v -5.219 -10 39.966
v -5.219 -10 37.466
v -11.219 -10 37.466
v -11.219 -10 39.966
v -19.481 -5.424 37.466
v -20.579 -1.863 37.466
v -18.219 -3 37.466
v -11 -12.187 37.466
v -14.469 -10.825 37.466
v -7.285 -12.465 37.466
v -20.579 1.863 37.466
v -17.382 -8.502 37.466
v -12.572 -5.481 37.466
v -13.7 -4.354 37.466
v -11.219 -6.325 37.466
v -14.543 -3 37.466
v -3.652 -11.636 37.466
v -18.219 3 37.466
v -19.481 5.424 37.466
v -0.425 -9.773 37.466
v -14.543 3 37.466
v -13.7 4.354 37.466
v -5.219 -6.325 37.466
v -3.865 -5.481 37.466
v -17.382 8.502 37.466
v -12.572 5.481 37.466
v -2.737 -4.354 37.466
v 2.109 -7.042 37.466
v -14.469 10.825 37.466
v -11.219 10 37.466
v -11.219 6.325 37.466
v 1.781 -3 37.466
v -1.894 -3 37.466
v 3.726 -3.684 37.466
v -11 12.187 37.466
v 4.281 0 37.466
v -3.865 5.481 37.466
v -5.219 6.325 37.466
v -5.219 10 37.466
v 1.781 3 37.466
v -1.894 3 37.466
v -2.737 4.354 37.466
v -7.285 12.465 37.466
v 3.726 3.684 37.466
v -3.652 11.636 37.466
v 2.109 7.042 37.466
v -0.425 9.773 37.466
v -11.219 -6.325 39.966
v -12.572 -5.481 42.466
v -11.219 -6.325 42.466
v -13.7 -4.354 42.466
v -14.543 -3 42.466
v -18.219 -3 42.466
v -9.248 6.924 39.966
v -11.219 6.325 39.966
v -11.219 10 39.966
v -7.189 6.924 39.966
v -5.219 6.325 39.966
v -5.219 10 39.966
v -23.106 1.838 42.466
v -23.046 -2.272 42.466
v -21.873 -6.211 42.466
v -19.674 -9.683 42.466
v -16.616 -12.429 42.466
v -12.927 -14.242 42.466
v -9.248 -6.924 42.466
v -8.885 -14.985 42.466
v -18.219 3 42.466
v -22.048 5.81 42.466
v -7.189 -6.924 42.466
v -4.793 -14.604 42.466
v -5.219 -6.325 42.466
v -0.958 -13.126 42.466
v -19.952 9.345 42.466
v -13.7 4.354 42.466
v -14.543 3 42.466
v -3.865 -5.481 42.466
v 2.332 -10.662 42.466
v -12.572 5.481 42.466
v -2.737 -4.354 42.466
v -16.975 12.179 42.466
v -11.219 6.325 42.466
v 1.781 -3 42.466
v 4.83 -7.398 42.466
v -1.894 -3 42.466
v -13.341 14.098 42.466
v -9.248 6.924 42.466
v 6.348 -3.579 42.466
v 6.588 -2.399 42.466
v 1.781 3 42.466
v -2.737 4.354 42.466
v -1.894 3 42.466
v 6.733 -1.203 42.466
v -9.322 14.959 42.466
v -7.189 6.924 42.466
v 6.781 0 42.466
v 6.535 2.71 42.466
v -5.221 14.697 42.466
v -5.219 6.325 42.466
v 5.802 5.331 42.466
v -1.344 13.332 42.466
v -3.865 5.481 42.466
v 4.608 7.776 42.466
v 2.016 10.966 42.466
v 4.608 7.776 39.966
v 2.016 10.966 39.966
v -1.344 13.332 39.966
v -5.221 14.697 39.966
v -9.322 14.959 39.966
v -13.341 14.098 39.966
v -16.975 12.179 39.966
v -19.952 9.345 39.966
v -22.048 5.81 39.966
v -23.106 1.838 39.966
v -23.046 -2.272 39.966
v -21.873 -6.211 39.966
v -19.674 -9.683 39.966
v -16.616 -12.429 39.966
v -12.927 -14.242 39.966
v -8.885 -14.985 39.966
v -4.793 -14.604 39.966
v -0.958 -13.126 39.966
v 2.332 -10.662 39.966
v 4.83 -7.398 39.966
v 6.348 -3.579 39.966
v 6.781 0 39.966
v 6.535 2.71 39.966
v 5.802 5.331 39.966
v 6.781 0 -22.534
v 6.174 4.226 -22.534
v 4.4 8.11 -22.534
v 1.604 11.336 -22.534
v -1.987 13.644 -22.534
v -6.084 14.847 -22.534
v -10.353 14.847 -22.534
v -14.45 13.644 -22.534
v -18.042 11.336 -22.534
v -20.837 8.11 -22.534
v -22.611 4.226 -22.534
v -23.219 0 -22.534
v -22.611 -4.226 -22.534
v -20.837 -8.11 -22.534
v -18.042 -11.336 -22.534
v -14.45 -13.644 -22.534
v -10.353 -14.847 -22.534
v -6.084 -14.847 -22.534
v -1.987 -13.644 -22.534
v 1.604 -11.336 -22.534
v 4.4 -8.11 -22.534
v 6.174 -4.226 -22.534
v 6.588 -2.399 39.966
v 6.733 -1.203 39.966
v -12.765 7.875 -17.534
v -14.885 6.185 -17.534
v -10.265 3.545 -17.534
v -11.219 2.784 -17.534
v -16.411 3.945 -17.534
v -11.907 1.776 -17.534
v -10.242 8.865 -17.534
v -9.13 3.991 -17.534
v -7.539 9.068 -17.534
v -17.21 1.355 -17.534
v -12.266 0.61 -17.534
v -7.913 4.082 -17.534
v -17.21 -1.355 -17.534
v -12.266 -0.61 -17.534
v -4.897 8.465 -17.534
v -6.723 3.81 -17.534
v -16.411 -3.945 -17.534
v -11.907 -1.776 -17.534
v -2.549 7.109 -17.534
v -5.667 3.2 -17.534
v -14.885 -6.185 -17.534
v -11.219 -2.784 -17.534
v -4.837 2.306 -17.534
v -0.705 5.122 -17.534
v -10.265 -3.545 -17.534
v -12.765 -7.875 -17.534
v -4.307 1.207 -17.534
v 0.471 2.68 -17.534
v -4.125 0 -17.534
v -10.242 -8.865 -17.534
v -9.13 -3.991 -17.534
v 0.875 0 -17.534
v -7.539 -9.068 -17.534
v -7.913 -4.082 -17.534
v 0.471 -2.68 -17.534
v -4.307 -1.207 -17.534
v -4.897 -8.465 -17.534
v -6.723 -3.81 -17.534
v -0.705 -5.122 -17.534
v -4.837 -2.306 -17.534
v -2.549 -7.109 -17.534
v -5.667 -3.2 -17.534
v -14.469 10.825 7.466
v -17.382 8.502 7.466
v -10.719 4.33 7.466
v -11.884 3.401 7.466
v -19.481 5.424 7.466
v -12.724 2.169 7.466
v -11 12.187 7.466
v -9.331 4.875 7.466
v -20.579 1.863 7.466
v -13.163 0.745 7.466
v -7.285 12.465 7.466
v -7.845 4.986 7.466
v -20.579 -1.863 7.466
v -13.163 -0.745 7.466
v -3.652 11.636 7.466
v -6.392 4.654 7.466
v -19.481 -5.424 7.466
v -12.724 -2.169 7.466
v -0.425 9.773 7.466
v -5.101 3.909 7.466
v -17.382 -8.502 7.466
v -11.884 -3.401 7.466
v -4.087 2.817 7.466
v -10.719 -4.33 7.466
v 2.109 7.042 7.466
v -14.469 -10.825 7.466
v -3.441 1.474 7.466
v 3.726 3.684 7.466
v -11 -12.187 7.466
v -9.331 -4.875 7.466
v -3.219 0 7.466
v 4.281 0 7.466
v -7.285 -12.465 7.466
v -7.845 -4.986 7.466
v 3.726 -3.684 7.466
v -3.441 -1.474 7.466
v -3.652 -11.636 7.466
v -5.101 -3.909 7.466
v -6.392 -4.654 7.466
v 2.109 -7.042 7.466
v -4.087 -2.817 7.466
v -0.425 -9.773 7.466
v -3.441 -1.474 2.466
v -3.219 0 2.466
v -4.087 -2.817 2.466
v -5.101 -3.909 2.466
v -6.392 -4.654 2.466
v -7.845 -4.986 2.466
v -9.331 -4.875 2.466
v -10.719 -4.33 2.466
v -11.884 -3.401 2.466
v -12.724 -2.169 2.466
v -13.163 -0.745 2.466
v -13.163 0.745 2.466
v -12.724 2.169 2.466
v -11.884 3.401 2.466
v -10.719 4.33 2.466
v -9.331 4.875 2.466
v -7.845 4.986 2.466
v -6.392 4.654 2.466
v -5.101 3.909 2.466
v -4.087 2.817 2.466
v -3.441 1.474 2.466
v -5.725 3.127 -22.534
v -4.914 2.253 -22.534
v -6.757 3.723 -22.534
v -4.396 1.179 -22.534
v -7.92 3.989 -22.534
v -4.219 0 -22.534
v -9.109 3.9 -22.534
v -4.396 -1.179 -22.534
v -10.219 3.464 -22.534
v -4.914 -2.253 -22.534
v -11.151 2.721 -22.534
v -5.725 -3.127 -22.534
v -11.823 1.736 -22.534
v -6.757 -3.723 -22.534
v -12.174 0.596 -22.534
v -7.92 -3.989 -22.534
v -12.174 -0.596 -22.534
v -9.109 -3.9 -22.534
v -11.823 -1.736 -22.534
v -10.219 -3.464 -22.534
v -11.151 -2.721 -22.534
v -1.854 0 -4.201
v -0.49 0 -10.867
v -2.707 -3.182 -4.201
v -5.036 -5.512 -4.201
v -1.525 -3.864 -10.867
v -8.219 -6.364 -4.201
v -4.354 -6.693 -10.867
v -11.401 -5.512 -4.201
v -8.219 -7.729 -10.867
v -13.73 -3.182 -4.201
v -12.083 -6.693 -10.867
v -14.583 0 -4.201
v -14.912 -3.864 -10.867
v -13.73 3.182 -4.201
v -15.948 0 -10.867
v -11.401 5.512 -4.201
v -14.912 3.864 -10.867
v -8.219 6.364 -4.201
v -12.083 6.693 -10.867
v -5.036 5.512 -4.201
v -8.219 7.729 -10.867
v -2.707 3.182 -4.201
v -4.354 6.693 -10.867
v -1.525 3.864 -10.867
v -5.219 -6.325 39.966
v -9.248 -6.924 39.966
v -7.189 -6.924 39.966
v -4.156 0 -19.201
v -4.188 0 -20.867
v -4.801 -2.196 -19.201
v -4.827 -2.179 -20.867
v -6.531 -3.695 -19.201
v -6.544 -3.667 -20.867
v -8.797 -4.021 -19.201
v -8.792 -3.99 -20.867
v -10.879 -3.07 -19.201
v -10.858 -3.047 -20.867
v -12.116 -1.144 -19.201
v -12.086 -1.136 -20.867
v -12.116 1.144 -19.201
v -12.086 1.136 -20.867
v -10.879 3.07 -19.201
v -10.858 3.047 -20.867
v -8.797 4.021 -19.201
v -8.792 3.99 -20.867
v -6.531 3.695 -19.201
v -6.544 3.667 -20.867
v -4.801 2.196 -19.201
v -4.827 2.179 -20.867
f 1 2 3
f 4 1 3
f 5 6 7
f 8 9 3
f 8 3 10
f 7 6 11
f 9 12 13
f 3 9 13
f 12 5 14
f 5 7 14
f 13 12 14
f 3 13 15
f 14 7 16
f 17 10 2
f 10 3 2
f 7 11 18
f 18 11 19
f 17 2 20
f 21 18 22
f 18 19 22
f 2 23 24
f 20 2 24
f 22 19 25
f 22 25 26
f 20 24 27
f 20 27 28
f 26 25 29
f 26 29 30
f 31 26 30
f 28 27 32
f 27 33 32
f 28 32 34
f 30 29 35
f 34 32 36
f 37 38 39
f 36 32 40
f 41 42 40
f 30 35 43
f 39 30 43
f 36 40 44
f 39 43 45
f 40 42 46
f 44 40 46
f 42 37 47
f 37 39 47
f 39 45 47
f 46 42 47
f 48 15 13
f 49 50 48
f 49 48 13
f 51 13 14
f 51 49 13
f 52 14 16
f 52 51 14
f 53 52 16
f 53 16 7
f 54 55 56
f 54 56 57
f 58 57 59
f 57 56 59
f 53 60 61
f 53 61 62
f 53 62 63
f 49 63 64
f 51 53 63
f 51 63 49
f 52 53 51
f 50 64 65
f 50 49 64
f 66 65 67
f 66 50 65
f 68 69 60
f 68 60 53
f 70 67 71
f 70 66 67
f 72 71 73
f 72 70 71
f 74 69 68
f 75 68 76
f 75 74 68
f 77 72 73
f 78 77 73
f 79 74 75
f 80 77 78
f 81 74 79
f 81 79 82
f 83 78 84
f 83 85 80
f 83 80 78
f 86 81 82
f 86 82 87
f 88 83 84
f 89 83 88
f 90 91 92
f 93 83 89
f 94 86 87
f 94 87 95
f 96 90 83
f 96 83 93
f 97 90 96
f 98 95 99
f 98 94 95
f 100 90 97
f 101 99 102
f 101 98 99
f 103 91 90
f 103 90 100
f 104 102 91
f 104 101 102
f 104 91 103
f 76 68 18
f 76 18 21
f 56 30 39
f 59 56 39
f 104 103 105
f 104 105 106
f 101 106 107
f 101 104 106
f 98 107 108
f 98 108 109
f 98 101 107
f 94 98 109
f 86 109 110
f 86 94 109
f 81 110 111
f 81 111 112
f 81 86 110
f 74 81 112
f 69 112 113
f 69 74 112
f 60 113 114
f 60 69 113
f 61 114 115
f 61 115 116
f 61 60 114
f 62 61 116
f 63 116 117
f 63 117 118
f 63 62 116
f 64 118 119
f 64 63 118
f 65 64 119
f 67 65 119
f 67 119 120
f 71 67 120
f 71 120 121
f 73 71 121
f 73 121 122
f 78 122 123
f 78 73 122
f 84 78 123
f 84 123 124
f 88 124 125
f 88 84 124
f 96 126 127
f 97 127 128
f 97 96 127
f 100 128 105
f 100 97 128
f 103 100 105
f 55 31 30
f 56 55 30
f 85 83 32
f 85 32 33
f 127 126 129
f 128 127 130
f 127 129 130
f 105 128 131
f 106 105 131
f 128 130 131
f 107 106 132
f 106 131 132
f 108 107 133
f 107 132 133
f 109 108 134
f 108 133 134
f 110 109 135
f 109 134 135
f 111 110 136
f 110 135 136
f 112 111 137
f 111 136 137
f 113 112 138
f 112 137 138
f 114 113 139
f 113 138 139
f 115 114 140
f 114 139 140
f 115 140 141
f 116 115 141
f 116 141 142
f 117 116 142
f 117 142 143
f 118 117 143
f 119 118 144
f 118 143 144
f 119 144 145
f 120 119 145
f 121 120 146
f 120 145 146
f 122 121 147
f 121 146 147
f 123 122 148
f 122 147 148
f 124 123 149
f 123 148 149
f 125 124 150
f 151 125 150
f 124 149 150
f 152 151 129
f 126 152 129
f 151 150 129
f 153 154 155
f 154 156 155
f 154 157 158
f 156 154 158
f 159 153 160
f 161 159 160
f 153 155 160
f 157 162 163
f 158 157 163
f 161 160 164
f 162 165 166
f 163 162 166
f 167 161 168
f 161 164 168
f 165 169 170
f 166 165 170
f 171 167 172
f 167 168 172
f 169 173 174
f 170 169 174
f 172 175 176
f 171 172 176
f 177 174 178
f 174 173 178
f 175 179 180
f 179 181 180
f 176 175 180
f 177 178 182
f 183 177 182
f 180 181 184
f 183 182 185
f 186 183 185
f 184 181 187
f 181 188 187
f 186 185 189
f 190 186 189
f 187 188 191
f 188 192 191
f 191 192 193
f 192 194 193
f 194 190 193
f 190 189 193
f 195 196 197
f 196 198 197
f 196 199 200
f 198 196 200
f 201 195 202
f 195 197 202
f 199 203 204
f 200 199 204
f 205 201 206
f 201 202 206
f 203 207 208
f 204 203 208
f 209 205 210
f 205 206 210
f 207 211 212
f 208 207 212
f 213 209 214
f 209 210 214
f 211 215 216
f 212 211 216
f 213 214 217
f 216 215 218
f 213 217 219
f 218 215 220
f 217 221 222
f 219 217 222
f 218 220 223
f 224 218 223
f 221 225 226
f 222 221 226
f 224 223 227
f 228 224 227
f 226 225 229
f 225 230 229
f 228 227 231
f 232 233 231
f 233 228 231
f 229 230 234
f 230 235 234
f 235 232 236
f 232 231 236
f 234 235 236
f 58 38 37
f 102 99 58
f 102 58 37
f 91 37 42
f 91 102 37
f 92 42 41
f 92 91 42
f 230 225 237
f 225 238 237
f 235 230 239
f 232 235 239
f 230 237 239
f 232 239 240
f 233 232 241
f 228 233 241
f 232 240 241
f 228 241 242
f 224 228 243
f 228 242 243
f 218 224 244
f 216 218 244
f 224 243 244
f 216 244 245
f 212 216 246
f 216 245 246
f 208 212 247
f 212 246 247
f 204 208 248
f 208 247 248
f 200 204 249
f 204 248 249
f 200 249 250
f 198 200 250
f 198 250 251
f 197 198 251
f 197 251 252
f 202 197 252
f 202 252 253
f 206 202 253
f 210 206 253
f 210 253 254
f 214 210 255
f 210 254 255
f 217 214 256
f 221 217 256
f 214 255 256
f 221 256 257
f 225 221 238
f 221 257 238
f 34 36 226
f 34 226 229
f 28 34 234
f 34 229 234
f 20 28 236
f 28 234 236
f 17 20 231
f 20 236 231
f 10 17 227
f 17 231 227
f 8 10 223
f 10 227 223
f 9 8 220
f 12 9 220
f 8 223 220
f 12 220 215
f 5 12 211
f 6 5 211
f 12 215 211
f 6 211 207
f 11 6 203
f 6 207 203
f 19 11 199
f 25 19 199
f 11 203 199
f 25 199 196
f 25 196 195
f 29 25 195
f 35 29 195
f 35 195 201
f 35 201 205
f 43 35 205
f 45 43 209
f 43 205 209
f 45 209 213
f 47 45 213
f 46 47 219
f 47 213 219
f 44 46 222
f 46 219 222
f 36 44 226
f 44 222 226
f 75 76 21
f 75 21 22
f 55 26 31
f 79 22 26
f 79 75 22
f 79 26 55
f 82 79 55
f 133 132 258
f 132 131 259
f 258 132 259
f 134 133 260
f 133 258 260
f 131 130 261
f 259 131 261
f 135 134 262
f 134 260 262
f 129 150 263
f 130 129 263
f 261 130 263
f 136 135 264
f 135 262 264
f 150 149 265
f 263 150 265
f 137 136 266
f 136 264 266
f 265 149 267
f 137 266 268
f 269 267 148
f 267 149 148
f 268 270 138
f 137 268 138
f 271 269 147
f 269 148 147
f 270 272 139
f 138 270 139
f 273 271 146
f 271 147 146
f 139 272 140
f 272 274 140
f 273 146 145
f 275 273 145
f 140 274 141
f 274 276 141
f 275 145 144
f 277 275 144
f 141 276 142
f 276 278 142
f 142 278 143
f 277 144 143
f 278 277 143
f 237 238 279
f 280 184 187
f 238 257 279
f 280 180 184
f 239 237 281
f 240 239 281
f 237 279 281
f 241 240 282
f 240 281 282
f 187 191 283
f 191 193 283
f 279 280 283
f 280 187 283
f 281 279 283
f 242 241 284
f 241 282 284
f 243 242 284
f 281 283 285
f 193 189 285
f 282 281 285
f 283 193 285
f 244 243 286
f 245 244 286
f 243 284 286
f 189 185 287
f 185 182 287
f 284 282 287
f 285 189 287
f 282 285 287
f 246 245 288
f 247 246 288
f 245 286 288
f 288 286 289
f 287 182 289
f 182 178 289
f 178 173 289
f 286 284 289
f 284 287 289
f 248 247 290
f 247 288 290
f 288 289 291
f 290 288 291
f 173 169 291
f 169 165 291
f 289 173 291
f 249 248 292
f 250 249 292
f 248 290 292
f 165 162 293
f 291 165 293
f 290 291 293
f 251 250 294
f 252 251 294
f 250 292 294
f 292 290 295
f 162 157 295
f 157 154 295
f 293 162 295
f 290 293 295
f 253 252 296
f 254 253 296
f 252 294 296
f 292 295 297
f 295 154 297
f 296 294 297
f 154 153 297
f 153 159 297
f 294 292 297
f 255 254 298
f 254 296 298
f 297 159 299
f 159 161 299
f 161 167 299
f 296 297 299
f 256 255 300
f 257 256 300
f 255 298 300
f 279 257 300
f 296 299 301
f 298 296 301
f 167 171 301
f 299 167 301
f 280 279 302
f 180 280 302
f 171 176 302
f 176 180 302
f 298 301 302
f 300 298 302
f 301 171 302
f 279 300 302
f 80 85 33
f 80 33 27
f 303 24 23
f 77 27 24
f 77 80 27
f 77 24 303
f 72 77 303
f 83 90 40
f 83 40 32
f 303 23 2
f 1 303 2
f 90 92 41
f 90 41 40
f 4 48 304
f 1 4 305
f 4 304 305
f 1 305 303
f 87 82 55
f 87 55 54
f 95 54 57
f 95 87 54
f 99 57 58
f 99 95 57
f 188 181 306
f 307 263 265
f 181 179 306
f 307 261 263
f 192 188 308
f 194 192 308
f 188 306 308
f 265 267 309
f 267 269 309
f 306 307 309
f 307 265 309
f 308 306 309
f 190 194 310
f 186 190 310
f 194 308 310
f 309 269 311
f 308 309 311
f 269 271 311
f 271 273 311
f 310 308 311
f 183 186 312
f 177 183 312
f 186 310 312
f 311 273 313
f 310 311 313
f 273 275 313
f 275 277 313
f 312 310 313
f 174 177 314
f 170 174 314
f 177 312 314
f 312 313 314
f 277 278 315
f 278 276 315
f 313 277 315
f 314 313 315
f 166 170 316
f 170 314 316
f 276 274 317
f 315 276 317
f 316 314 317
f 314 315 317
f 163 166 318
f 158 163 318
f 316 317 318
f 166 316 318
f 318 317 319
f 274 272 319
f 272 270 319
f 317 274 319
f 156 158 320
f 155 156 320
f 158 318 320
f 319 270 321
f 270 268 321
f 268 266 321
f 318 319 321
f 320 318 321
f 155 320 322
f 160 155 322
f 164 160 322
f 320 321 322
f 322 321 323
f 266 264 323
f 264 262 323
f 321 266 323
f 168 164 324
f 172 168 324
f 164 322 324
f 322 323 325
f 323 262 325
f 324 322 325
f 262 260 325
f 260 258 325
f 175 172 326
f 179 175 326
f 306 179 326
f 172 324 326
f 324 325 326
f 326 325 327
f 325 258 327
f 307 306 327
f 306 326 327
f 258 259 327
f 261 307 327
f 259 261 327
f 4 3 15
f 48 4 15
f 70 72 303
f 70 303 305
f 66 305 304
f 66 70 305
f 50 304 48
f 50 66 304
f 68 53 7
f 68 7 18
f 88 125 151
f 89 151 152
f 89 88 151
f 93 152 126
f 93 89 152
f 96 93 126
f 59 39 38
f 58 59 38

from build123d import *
from build123d import SkipClean  # not in build123d's __all__

# Parameters (mm, degrees)
F1_DEPTH  = 2.5
F3_DEPTH  = 2.5
F6_ANGLE  = 90
F8_R      = 12.5
F9_DEPTH  = 2.5
F10_DEPTH = 2.5
F13_DEPTH = 2.5


with BuildPart() as f1:
    # F0 (on Front) → F1 (new body)
    with BuildSketch(Plane.XZ):
        with BuildLine():
            ThreePointArc((-66.598045975, 33.1235192716), (-51.598045975, 18.1235192716), (-36.598045975, 33.1235192716))
            ThreePointArc((-36.598045975, 33.1235192716), (-51.598045975, 48.1235192716), (-66.598045975, 33.1235192716))
        make_face()
        with BuildLine():
            ThreePointArc((-48.598045975, 39.4480745919), (-46.6482985067, 38.0732667399), (-45.2734906546, 36.1235192716))
            Line((-45.2734906546, 36.1235192716), (-41.598045975, 36.1235192716))
            Line((-41.598045975, 36.1235192716), (-41.598045975, 30.1235192716))
            Line((-41.598045975, 30.1235192716), (-45.2734906546, 30.1235192716))
            ThreePointArc((-45.2734906546, 30.1235192716), (-46.6482985067, 28.1737718033), (-48.598045975, 26.7989639513))
            Line((-48.598045975, 26.7989639513), (-48.598045975, 23.1235192716))
            Line((-48.598045975, 23.1235192716), (-54.598045975, 23.1235192716))
            Line((-54.598045975, 23.1235192716), (-54.598045975, 26.7989639513))
            ThreePointArc((-54.598045975, 26.7989639513), (-56.5477934433, 28.1737718033), (-57.9226012953, 30.1235192716))
            Line((-57.9226012953, 30.1235192716), (-61.598045975, 30.1235192716))
            Line((-61.598045975, 30.1235192716), (-61.598045975, 36.1235192716))
            Line((-61.598045975, 36.1235192716), (-57.9226012953, 36.1235192716))
            ThreePointArc((-57.9226012953, 36.1235192716), (-56.5477934433, 38.0732667399), (-54.598045975, 39.4480745919))
            Line((-54.598045975, 39.4480745919), (-54.598045975, 43.1235192716))
            Line((-54.598045975, 43.1235192716), (-48.598045975, 43.1235192716))
            Line((-48.598045975, 43.1235192716), (-48.598045975, 39.4480745919))
        make_face(mode=Mode.SUBTRACT)
    extrude(amount=F1_DEPTH)

    # F2 (on face) → F3 (join)
    with BuildSketch(Plane(origin=(0, 0, 0), x_dir=(-1, 0, 0), z_dir=(0, 1, 0))):
        with BuildLine():
            ThreePointArc((66.598045975, 33.1235192716), (66.0446186482, 37.1604163471), (64.4251742419, 40.899429535))
            ThreePointArc((64.4251742419, 40.899429535), (36.7710486733, 30.8519226932), (66.164820243, 29.5445407268))
            ThreePointArc((66.164820243, 29.5445407268), (66.4893456835, 31.3209674721), (66.598045975, 33.1235192716))
        make_face()
        with BuildLine():
            ThreePointArc((54.598045975, 39.4480745919), (56.5477934433, 38.0732667399), (57.9226012953, 36.1235192716))
            Line((57.9226012953, 36.1235192716), (61.598045975, 36.1235192716))
            Line((61.598045975, 36.1235192716), (61.598045975, 30.1235192716))
            Line((61.598045975, 30.1235192716), (57.9226012953, 30.1235192716))
            ThreePointArc((57.9226012953, 30.1235192716), (56.5477934433, 28.1737718033), (54.598045975, 26.7989639513))
            ThreePointArc((54.598045975, 26.7989639513), (51.598045975, 26.1235192716), (48.598045975, 26.7989639513))
            ThreePointArc((48.598045975, 26.7989639513), (46.6482985067, 28.1737718033), (45.2734906546, 30.1235192716))
            Line((45.2734906546, 30.1235192716), (41.598045975, 30.1235192716))
            Line((41.598045975, 30.1235192716), (41.598045975, 36.1235192716))
            Line((41.598045975, 36.1235192716), (45.2734906546, 36.1235192716))
            ThreePointArc((45.2734906546, 36.1235192716), (46.6482985067, 38.0732667399), (48.598045975, 39.4480745919))
            ThreePointArc((48.598045975, 39.4480745919), (51.598045975, 40.1235192716), (54.598045975, 39.4480745919))
        make_face(mode=Mode.SUBTRACT)
    with SkipClean():  # cleaning this boolean's faces spoils the solid; the shape is the same uncleaned
        extrude(amount=F3_DEPTH)


with BuildPart() as f5:
    # F4 (on Front) → F5 (revolve)
    with BuildSketch(Plane.XZ):
        Polygon((6.781338717, -22.533902707), (6.781338717, 37.466097293), (4.281338717, 37.466097293), (4.281338717, 7.466097293), (-3.218661283, 7.466097293), (-3.218661283, 2.466097293), (0.8746451318, -17.533902707), (-4.1253548682, -17.533902707), (-4.218661283, -22.533902707), align=None)
    revolve(axis=Axis((-8.218661283, 0, -12.1948756373), (0, 0, -1)))

    # F8 (on offset) → F9 (join)
    with BuildSketch(Plane.XY.offset(37.466097293)):
        with BuildLine():
            ThreePointArc((-23.218661283, 0), (-8.218661283, -15), (6.781338717, 0))
            ThreePointArc((6.781338717, 0), (-8.218661283, 15), (-23.218661283, 0))
        make_face()
        with Locations((-8.218661283, 0)):
            Circle(F8_R, mode=Mode.SUBTRACT)
    extrude(amount=F9_DEPTH)

    # F8 (on offset) → F10 (join)
    with BuildSketch(Plane.XY.offset(37.466097293)):
        with Locations((-8.218661283, 0)):
            Circle(F8_R)
        with BuildLine():
            ThreePointArc((-5.218661283, 6.3245553203), (-3.2689138147, 4.9497474683), (-1.8941059626, 3))
            Line((-1.8941059626, 3), (1.781338717, 3))
            Line((1.781338717, 3), (1.781338717, -3))
            Line((1.781338717, -3), (-1.8941059626, -3))
            ThreePointArc((-1.8941059626, -3), (-3.2689138147, -4.9497474683), (-5.218661283, -6.3245553203))
            Line((-5.218661283, -6.3245553203), (-5.218661283, -10))
            Line((-5.218661283, -10), (-11.218661283, -10))
            Line((-11.218661283, -10), (-11.218661283, -6.3245553203))
            ThreePointArc((-11.218661283, -6.3245553203), (-13.1684087513, -4.9497474683), (-14.5432166033, -3))
            Line((-14.5432166033, -3), (-18.218661283, -3))
            Line((-18.218661283, -3), (-18.218661283, 3))
            Line((-18.218661283, 3), (-14.5432166033, 3))
            ThreePointArc((-14.5432166033, 3), (-13.1684087513, 4.9497474683), (-11.218661283, 6.3245553203))
            Line((-11.218661283, 6.3245553203), (-11.218661283, 10))
            Line((-11.218661283, 10), (-5.218661283, 10))
            Line((-5.218661283, 10), (-5.218661283, 6.3245553203))
        make_face(mode=Mode.SUBTRACT)
    extrude(amount=F10_DEPTH)

    # F12 (on offset) → F13 (join)
    with BuildSketch(Plane.XY.offset(42.466097293)):
        with BuildLine():
            ThreePointArc((6.781338717, 0), (6.2279113902, 4.0368970755), (4.6084669839, 7.7759102634))
            ThreePointArc((4.6084669839, 7.7759102634), (-23.0456585847, -2.2715965784), (6.3481129851, -3.5789785448))
            ThreePointArc((6.3481129851, -3.5789785448), (6.6726384256, -1.8025517995), (6.781338717, 0))
        make_face()
        with BuildLine():
            ThreePointArc((-5.218661283, 6.3245553203), (-3.2689138147, 4.9497474683), (-1.8941059626, 3))
            Line((-1.8941059626, 3), (1.781338717, 3))
            Line((1.781338717, 3), (1.781338717, -3))
            Line((1.781338717, -3), (-1.8941059626, -3))
            ThreePointArc((-1.8941059626, -3), (-3.2689138147, -4.9497474683), (-5.218661283, -6.3245553203))
            ThreePointArc((-5.218661283, -6.3245553203), (-8.218661283, -7), (-11.218661283, -6.3245553203))
            ThreePointArc((-11.218661283, -6.3245553203), (-13.1684087513, -4.9497474683), (-14.5432166033, -3))
            Line((-14.5432166033, -3), (-18.218661283, -3))
            Line((-18.218661283, -3), (-18.218661283, 3))
            Line((-18.218661283, 3), (-14.5432166033, 3))
            ThreePointArc((-14.5432166033, 3), (-13.1684087513, 4.9497474683), (-11.218661283, 6.3245553203))
            ThreePointArc((-11.218661283, 6.3245553203), (-8.218661283, 7), (-5.218661283, 6.3245553203))
        make_face(mode=Mode.SUBTRACT)
    extrude(amount=-F13_DEPTH)


with BuildPart() as f1_1:
    # F6: moved
    add(f1.part.rotate(Axis((-43.4357683148, 2.5, 36.1235192716), (-1, 0, 0)), F6_ANGLE), clean=False)


solid = f5.part
